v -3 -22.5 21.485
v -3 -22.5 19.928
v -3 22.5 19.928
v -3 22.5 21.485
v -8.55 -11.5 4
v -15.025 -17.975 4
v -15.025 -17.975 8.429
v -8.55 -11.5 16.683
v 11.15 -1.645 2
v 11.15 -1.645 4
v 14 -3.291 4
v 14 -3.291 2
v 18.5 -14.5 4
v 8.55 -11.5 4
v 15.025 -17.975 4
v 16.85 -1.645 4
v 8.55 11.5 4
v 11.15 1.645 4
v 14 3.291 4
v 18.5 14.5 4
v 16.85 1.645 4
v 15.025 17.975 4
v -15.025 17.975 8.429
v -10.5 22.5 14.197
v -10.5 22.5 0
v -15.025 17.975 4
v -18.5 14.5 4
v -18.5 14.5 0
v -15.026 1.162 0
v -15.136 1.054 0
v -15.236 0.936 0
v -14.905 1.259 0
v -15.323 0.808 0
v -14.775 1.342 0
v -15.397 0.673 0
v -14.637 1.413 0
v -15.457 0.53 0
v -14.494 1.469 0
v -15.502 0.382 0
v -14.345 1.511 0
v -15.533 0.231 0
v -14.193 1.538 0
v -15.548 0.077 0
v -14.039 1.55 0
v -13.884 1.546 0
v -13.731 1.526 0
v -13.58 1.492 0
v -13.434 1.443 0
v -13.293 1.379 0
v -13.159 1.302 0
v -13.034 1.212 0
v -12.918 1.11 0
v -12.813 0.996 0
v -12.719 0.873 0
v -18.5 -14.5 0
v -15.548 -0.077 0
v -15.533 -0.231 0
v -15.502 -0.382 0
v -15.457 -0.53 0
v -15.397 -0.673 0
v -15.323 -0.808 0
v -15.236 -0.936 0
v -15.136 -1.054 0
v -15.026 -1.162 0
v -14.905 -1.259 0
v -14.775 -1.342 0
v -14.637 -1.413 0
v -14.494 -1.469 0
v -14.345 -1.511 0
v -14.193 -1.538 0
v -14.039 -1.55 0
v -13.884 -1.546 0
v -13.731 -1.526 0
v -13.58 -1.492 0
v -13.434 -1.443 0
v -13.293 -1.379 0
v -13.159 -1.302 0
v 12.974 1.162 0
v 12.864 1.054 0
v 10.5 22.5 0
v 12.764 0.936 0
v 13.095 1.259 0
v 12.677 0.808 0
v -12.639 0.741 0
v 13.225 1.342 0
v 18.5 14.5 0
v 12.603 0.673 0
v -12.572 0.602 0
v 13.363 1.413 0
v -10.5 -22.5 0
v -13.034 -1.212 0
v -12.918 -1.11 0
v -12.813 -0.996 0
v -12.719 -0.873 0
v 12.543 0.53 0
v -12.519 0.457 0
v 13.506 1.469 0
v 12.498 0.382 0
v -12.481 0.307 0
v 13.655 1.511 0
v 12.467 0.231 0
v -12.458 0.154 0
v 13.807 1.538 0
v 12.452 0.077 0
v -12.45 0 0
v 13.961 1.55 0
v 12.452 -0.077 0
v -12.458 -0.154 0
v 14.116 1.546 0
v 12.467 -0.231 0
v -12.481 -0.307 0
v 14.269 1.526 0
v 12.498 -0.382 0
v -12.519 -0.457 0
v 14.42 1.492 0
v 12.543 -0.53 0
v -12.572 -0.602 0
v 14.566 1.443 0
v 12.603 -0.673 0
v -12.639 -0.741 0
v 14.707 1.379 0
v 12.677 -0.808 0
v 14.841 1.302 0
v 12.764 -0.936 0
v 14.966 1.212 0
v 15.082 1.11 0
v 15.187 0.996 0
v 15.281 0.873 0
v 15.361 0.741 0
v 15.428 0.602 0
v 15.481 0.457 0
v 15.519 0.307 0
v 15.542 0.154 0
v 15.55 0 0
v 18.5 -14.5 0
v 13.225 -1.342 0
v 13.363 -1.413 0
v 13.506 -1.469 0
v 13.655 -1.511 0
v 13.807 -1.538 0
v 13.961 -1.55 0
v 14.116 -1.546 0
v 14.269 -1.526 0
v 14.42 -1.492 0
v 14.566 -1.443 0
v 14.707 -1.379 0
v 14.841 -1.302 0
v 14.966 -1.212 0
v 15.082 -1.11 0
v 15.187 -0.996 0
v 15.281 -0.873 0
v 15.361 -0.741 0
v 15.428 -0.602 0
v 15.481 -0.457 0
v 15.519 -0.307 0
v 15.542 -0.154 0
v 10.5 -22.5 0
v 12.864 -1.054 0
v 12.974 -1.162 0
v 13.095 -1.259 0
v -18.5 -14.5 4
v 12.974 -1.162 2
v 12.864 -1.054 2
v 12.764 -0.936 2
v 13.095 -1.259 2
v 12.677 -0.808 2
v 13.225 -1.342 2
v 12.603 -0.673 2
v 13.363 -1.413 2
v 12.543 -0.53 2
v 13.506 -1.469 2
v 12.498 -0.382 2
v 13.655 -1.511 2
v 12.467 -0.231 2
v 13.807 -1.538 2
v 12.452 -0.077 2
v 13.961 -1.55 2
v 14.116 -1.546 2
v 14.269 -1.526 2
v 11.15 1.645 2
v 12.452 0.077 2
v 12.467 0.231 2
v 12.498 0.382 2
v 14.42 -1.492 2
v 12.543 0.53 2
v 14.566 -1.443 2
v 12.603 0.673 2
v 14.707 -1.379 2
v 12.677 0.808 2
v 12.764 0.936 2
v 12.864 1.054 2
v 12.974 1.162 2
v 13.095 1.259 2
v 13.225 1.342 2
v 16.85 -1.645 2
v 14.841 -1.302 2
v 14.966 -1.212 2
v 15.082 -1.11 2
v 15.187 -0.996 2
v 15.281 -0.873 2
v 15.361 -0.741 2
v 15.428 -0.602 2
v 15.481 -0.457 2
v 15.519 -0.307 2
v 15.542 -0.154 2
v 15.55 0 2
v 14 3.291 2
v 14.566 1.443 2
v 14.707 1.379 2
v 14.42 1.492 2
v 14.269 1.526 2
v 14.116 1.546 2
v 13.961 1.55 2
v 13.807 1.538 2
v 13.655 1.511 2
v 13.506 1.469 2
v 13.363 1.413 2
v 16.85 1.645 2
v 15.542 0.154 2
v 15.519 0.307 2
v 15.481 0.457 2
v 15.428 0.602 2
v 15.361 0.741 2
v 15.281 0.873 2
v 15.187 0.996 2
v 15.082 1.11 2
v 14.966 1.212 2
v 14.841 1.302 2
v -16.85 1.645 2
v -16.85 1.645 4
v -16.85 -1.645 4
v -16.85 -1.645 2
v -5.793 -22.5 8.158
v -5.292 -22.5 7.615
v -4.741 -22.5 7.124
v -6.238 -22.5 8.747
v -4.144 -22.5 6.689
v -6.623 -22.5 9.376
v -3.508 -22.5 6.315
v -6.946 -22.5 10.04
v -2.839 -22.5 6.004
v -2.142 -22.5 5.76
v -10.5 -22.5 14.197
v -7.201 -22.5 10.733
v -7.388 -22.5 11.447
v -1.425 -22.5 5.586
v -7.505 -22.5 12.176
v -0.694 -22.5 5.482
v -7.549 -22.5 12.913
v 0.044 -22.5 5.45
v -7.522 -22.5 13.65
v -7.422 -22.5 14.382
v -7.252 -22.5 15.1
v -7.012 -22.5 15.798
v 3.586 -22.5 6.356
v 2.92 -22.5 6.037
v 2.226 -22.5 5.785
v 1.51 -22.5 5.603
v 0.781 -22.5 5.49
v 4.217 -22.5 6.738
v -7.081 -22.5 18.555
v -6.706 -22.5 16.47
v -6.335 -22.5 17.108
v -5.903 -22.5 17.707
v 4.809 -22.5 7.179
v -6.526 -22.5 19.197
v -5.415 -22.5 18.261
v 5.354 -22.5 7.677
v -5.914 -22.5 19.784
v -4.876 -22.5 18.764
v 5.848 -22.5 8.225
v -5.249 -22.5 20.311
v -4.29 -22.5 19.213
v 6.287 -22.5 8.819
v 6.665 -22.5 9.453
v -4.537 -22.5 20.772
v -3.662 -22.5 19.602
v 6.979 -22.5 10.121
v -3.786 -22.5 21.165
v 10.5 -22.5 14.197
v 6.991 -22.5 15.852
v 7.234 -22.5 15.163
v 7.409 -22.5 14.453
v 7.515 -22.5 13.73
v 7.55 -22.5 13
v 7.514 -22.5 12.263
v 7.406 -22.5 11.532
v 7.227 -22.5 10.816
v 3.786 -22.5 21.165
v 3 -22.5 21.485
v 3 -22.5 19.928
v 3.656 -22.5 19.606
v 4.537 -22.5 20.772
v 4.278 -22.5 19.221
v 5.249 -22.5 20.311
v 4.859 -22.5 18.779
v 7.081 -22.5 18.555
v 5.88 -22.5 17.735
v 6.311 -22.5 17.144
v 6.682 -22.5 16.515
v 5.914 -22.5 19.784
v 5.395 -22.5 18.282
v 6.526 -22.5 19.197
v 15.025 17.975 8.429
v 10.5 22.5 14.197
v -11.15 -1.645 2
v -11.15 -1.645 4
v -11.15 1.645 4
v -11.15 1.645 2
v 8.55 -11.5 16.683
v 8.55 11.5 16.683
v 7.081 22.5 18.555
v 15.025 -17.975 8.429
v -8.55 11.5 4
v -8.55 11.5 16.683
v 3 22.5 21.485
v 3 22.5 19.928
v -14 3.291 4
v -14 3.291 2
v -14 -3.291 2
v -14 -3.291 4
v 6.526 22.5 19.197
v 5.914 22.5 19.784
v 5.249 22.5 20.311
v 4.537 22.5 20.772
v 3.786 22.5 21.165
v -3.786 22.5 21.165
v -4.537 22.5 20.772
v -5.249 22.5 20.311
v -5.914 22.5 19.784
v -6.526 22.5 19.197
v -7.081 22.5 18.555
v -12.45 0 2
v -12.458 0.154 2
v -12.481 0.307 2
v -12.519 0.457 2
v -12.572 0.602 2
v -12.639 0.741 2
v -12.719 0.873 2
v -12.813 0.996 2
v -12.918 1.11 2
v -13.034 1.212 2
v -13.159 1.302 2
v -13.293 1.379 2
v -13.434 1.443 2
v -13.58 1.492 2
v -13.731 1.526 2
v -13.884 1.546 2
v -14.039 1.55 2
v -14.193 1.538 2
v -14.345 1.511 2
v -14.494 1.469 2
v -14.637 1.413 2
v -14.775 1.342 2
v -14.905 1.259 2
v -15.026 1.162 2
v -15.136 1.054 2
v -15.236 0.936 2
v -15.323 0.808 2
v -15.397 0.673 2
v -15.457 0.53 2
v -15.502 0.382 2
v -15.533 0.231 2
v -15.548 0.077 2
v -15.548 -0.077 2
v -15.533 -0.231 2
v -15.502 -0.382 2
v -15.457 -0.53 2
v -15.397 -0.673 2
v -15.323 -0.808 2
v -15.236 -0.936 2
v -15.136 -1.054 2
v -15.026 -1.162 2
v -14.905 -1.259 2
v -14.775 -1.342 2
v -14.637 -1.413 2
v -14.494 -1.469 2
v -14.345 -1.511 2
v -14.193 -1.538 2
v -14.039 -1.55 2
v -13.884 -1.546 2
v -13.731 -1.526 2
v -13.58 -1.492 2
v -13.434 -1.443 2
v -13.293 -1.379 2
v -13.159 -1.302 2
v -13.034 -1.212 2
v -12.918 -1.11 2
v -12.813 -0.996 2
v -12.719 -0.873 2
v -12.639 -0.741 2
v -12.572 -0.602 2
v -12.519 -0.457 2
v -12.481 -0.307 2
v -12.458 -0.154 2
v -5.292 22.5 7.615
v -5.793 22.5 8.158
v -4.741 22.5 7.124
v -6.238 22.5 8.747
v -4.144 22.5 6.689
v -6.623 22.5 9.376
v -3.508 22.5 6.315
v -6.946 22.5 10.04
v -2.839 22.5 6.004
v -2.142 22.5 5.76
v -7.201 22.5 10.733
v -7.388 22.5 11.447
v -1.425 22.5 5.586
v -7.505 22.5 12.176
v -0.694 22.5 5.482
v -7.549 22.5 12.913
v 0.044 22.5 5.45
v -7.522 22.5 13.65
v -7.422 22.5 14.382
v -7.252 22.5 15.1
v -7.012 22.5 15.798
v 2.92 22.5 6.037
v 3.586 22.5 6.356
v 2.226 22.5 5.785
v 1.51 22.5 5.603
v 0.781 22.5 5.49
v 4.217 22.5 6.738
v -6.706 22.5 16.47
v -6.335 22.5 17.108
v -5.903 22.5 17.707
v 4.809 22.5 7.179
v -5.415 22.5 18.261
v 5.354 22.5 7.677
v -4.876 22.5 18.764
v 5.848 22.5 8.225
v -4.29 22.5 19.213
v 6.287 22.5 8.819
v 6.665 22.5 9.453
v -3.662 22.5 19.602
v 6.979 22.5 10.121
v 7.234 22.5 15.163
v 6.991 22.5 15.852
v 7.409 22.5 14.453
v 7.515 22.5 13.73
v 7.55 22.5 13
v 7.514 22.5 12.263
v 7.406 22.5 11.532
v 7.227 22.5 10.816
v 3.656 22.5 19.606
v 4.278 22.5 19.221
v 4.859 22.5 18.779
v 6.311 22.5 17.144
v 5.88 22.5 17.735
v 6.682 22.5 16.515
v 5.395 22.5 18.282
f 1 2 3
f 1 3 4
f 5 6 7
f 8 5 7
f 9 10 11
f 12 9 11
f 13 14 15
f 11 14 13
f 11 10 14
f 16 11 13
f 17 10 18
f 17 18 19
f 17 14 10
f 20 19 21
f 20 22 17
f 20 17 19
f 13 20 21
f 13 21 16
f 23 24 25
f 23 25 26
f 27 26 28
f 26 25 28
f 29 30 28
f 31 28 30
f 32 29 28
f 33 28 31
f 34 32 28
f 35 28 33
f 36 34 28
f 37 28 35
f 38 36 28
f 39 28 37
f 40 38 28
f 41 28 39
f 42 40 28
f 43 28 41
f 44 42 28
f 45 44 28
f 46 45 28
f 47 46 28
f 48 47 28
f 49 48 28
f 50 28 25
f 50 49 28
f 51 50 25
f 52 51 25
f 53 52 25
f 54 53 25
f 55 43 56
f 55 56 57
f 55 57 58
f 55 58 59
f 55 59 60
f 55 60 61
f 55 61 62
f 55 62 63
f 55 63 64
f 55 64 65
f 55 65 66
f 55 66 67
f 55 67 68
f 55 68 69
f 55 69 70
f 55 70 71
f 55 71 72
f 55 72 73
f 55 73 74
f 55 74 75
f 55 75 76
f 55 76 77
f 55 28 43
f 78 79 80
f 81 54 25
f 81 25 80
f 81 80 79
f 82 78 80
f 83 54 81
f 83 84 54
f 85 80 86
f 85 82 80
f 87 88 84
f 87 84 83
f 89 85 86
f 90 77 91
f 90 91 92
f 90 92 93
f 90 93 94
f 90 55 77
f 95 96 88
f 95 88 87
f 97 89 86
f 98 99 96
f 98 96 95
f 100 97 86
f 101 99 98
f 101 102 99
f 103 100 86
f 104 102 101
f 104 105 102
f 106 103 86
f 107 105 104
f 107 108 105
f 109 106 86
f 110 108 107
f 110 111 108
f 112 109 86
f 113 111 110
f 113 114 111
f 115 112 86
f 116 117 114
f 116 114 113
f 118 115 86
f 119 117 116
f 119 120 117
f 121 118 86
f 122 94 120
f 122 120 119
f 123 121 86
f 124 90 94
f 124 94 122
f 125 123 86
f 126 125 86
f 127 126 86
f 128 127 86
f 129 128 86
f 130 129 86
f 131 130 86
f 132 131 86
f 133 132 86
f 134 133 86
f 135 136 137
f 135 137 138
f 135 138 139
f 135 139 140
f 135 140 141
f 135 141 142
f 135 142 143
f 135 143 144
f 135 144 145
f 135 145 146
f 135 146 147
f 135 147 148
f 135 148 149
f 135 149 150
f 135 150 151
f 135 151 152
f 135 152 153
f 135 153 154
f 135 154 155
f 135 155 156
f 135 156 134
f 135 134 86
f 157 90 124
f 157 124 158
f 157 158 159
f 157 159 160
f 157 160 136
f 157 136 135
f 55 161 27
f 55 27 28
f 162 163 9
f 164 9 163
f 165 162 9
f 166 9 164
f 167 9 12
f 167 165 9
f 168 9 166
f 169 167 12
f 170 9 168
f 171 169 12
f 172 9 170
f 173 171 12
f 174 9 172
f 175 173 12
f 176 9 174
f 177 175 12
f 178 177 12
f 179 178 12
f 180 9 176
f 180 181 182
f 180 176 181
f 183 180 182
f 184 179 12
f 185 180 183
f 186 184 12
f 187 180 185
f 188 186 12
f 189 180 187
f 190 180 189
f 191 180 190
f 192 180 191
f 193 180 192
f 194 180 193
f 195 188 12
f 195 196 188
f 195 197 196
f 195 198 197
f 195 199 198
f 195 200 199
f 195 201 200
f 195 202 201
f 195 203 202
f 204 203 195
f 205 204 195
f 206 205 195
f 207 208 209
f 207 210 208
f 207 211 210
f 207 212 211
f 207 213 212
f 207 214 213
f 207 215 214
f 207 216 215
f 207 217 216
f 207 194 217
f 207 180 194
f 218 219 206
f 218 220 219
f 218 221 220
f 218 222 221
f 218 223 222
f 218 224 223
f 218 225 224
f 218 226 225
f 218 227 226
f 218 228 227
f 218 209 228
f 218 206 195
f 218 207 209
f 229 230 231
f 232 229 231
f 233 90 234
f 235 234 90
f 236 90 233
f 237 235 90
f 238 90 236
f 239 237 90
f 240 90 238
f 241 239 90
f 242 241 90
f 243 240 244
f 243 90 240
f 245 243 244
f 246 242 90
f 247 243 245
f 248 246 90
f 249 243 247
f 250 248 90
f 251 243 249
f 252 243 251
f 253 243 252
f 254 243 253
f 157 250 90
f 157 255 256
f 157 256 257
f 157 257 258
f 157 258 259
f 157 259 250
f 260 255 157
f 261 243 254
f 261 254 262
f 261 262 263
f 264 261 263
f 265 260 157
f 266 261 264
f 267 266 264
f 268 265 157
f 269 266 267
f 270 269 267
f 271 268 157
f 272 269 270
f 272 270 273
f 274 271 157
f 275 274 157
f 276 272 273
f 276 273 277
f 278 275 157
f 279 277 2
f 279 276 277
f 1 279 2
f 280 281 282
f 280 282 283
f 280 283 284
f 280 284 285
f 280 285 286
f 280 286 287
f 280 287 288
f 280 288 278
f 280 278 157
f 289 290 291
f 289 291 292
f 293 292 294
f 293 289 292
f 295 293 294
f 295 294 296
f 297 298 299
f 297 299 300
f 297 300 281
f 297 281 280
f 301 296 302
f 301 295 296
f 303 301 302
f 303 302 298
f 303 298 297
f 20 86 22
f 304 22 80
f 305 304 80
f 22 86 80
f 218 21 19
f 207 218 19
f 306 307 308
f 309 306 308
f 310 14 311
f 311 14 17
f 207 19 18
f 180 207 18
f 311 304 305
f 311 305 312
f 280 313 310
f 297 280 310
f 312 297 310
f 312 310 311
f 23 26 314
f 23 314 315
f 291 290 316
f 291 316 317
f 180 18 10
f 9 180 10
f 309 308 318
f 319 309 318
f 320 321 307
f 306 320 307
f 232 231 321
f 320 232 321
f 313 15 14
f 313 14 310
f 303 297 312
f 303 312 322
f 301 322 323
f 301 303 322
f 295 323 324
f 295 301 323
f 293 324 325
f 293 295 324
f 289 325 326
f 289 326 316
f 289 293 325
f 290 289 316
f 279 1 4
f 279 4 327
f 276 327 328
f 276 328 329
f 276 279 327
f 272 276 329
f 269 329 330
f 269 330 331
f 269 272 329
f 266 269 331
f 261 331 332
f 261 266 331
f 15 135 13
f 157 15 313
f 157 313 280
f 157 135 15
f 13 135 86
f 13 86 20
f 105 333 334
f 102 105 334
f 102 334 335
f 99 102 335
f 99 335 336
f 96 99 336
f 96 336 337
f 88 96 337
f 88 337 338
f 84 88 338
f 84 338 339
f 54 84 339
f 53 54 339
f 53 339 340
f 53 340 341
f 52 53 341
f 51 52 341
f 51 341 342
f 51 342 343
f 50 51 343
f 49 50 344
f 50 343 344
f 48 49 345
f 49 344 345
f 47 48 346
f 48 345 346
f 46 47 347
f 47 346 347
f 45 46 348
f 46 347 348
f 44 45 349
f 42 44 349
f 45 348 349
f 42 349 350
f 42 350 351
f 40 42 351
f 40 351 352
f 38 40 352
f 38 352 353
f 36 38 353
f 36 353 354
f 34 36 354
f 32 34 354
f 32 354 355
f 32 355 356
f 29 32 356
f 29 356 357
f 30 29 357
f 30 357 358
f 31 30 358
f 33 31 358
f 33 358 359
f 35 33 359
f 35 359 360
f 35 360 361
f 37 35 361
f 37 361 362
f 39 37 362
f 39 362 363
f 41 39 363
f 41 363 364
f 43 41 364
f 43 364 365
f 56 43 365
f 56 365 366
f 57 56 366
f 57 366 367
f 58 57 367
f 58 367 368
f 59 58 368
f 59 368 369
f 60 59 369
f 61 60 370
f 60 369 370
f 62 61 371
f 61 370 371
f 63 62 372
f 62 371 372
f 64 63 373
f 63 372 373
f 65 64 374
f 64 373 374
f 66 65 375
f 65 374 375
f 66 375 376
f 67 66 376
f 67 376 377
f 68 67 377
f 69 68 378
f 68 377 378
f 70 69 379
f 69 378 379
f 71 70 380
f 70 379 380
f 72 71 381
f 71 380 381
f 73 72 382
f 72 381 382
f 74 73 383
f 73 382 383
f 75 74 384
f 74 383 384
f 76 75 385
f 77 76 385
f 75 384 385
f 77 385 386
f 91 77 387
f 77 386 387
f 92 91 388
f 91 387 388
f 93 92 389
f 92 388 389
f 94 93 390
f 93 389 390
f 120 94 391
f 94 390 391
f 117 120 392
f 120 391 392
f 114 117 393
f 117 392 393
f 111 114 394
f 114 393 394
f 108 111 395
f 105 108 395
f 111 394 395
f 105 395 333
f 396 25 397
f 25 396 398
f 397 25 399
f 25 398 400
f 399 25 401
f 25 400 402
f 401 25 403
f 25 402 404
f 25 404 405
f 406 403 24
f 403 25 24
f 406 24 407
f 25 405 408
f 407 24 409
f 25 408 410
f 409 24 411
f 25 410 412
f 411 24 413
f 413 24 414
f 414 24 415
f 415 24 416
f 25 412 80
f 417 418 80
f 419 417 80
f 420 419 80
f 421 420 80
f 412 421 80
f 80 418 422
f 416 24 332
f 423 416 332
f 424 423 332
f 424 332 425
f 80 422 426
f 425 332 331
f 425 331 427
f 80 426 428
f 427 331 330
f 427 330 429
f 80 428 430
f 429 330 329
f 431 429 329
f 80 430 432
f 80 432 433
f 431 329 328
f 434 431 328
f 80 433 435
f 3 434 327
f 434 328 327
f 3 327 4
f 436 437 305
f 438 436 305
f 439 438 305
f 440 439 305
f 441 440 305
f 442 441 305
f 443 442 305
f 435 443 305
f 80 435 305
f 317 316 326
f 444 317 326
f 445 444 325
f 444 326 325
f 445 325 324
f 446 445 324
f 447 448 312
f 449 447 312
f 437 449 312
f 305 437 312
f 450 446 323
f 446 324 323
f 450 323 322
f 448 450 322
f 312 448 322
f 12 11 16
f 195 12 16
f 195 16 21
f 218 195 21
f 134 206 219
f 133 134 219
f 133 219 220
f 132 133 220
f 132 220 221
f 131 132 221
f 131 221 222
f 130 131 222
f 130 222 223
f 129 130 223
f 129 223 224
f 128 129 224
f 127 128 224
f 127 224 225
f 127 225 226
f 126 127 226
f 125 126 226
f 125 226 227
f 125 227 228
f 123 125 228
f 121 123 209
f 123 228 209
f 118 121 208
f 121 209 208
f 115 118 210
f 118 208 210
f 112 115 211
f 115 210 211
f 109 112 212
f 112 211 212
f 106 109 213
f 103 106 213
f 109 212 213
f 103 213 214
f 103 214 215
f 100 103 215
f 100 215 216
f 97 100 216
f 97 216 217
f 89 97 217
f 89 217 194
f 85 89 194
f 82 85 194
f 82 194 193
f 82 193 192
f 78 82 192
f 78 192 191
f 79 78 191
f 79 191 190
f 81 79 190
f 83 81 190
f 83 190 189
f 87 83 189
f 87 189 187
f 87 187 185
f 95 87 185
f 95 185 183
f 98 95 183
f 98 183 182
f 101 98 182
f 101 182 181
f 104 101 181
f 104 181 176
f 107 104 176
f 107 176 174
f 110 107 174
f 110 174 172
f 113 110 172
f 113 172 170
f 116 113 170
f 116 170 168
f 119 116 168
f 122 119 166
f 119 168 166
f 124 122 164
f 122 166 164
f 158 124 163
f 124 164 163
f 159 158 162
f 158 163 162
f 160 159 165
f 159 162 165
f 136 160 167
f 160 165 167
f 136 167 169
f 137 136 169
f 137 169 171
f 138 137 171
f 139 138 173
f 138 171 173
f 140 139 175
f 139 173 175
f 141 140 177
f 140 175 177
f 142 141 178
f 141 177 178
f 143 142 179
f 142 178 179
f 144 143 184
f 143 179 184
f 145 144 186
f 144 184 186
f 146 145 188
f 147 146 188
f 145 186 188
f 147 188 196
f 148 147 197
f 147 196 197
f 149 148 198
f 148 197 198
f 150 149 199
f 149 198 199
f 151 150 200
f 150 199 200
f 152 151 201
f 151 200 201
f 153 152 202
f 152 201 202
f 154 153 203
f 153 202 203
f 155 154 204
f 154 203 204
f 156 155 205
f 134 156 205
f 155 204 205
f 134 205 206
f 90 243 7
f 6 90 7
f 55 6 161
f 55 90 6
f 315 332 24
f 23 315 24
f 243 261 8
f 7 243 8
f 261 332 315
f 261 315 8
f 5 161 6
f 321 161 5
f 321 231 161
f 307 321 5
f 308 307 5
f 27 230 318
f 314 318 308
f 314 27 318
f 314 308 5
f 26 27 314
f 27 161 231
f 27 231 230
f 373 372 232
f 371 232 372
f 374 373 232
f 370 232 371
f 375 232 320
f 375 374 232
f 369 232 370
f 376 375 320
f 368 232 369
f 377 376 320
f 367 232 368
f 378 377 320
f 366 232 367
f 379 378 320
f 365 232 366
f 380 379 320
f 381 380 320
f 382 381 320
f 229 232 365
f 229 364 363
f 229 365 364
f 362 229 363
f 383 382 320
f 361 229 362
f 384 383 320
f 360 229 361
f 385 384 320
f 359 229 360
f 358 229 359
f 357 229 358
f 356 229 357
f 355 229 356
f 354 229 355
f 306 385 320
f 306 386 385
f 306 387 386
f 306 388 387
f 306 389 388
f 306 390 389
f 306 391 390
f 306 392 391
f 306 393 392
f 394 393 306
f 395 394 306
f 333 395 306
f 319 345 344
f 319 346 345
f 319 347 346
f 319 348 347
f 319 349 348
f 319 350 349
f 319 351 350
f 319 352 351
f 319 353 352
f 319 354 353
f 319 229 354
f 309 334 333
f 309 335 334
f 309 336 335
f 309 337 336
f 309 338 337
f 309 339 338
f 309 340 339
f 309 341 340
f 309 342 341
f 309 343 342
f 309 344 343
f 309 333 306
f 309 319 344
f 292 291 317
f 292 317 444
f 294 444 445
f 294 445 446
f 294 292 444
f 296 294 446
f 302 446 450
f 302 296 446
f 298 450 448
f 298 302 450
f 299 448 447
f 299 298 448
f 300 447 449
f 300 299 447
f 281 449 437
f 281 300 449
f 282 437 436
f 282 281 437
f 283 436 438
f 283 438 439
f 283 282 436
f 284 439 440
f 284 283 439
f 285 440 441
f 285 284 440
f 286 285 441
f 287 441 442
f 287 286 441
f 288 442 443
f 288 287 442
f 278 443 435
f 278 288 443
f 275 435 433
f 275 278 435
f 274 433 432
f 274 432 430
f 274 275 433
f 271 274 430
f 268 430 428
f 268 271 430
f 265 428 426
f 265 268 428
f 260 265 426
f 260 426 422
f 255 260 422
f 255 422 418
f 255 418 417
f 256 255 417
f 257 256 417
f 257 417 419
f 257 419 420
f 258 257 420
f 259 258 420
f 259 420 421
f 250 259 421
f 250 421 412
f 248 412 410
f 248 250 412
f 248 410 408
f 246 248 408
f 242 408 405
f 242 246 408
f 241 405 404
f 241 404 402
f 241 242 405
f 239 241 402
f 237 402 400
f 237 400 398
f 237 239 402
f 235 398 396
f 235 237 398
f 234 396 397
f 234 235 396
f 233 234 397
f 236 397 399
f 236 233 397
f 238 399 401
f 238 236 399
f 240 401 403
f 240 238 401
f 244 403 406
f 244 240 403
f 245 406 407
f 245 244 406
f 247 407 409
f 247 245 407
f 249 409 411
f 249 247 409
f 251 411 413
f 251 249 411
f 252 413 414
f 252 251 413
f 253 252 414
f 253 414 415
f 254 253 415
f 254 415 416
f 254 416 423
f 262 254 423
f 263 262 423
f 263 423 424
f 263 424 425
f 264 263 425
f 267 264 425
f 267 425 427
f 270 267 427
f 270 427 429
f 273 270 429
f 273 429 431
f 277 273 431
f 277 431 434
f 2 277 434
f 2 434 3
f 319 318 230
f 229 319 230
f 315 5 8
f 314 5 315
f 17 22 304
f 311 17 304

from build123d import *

# Parameters (mm, degrees)
F1_DEPTH    = 22.5
F3_W        = 9.95
F3_H        = 39
F4_DEPTH    = 12.6836794258
F5_R        = 1.55
F6_DEPTH    = 4
F7_DEPTH    = 2
F8_SIZE2    = 8
F8_SIZE     = 8
F9_T1_DEPTH = 45.1469278075


# Not quite as in the source:
# - a fillet or chamfer that OpenCascade refuses, or shapes differently, is made with other operations: its cross-section is extruded or revolved along the edge and cut away or added


with BuildPart() as f1:
    # F0 (on Front) → F1 (new body, symmetric)
    with BuildSketch(Plane.XZ):
        with BuildLine():
            Line((18.5, 4), (7.0809214412, 18.555227407))
            ThreePointArc((7.0809214412, 18.555227407), (8.5067118492, 15.9386822752), (9, 13))
            ThreePointArc((9, 13), (-2.9386822752, 4.4932881508), (-7.0809214412, 18.555227407))
            Line((-7.0809214412, 18.555227407), (-18.5, 4))
            Line((-18.5, 4), (-18.5, 0))
            Line((-18.5, 0), (18.5, 0))
            Line((18.5, 0), (18.5, 4))
        make_face()
        with BuildLine():
            ThreePointArc((3, 19.9283836499), (6.3108042277, 17.1444239648), (7.55, 13))
            ThreePointArc((7.55, 13), (-4.1444239648, 6.6891957723), (-3, 19.9283836499))
            Line((-3, 19.9283836499), (-3, 21.4852813742))
            ThreePointArc((-3, 21.4852813742), (-5.2490521372, 20.3107764062), (-7.0809214412, 18.555227407))
            ThreePointArc((-7.0809214412, 18.555227407), (-2.9386822752, 4.4932881508), (9, 13))
            ThreePointArc((9, 13), (8.5067118492, 15.9386822752), (7.0809214412, 18.555227407))
            ThreePointArc((7.0809214412, 18.555227407), (5.2490521372, 20.3107764062), (3, 21.4852813742))
            Line((3, 21.4852813742), (3, 19.9283836499))
        make_face()
    extrude(amount=F1_DEPTH, both=True)

    # F3 (on offset) → F4 (cut, through all)
    with BuildSketch(Plane.XY.offset(4)):
        with Locations((-13.525, 0)):
            Rectangle(F3_W, F3_H)
        with Locations((13.525, 0)):
            Rectangle(F3_W, F3_H)
    extrude(amount=F4_DEPTH, mode=Mode.SUBTRACT)

    # F5 (on face) → F6 (cut, through all)
    with BuildSketch(Plane.XY.offset(4)):
        with Locations((14, 0)):
            Circle(F5_R)
        with Locations((-14, 0)):
            Circle(F5_R)
    extrude(amount=-F6_DEPTH, mode=Mode.SUBTRACT)

    # F5 (on face) → F7 (cut)
    with BuildSketch(Plane.XY.offset(4)):
        Polygon((11.15, 1.6454482672), (11.15, -1.6454482672), (14, -3.2908965344), (16.85, -1.6454482672), (16.85, 1.6454482672), (14, 3.2908965344), align=None)
        with Locations((14, 0)):
            Circle(F5_R, mode=Mode.SUBTRACT)
        Polygon((-11.15, -1.6454482672), (-11.15, 1.6454482672), (-14, 3.2908965344), (-16.85, 1.6454482672), (-16.85, -1.6454482672), (-14, -3.2908965344), align=None)
        with Locations((-14, 0)):
            Circle(F5_R, mode=Mode.SUBTRACT)
    extrude(amount=-F7_DEPTH, mode=Mode.SUBTRACT)

    # F8
    f8_edges = [f1.edges().sort_by_distance(p)[0] for p in [
        (-8.55, 19.5, 10.34134),
        (-8.55, -19.5, 10.34134),
        (8.55, 19.5, 10.34134),
        (8.55, -19.5, 10.34134),
    ]]
    chamfer(f8_edges, length=F8_SIZE, length2=F8_SIZE2)

    # F9: chamfer of 8 on 4 edges, made by hand

    # F9_s2 → F9_t1 (cut)
    with BuildSketch(Plane.XY.offset(-20.5734639037)):
        Polygon((-10.5, 22.5), (-18.5, 14.5), (-18.5, 22.5), align=None)
        Polygon((-10.5, -22.5), (-18.5, -14.5), (-18.5, -22.5), align=None)
        Polygon((18.5, 14.5), (10.5, 22.5), (18.5, 22.5), align=None)
        Polygon((18.5, -14.5), (10.5, -22.5), (18.5, -22.5), align=None)
    extrude(amount=F9_T1_DEPTH, mode=Mode.SUBTRACT)


solid = f1.part
